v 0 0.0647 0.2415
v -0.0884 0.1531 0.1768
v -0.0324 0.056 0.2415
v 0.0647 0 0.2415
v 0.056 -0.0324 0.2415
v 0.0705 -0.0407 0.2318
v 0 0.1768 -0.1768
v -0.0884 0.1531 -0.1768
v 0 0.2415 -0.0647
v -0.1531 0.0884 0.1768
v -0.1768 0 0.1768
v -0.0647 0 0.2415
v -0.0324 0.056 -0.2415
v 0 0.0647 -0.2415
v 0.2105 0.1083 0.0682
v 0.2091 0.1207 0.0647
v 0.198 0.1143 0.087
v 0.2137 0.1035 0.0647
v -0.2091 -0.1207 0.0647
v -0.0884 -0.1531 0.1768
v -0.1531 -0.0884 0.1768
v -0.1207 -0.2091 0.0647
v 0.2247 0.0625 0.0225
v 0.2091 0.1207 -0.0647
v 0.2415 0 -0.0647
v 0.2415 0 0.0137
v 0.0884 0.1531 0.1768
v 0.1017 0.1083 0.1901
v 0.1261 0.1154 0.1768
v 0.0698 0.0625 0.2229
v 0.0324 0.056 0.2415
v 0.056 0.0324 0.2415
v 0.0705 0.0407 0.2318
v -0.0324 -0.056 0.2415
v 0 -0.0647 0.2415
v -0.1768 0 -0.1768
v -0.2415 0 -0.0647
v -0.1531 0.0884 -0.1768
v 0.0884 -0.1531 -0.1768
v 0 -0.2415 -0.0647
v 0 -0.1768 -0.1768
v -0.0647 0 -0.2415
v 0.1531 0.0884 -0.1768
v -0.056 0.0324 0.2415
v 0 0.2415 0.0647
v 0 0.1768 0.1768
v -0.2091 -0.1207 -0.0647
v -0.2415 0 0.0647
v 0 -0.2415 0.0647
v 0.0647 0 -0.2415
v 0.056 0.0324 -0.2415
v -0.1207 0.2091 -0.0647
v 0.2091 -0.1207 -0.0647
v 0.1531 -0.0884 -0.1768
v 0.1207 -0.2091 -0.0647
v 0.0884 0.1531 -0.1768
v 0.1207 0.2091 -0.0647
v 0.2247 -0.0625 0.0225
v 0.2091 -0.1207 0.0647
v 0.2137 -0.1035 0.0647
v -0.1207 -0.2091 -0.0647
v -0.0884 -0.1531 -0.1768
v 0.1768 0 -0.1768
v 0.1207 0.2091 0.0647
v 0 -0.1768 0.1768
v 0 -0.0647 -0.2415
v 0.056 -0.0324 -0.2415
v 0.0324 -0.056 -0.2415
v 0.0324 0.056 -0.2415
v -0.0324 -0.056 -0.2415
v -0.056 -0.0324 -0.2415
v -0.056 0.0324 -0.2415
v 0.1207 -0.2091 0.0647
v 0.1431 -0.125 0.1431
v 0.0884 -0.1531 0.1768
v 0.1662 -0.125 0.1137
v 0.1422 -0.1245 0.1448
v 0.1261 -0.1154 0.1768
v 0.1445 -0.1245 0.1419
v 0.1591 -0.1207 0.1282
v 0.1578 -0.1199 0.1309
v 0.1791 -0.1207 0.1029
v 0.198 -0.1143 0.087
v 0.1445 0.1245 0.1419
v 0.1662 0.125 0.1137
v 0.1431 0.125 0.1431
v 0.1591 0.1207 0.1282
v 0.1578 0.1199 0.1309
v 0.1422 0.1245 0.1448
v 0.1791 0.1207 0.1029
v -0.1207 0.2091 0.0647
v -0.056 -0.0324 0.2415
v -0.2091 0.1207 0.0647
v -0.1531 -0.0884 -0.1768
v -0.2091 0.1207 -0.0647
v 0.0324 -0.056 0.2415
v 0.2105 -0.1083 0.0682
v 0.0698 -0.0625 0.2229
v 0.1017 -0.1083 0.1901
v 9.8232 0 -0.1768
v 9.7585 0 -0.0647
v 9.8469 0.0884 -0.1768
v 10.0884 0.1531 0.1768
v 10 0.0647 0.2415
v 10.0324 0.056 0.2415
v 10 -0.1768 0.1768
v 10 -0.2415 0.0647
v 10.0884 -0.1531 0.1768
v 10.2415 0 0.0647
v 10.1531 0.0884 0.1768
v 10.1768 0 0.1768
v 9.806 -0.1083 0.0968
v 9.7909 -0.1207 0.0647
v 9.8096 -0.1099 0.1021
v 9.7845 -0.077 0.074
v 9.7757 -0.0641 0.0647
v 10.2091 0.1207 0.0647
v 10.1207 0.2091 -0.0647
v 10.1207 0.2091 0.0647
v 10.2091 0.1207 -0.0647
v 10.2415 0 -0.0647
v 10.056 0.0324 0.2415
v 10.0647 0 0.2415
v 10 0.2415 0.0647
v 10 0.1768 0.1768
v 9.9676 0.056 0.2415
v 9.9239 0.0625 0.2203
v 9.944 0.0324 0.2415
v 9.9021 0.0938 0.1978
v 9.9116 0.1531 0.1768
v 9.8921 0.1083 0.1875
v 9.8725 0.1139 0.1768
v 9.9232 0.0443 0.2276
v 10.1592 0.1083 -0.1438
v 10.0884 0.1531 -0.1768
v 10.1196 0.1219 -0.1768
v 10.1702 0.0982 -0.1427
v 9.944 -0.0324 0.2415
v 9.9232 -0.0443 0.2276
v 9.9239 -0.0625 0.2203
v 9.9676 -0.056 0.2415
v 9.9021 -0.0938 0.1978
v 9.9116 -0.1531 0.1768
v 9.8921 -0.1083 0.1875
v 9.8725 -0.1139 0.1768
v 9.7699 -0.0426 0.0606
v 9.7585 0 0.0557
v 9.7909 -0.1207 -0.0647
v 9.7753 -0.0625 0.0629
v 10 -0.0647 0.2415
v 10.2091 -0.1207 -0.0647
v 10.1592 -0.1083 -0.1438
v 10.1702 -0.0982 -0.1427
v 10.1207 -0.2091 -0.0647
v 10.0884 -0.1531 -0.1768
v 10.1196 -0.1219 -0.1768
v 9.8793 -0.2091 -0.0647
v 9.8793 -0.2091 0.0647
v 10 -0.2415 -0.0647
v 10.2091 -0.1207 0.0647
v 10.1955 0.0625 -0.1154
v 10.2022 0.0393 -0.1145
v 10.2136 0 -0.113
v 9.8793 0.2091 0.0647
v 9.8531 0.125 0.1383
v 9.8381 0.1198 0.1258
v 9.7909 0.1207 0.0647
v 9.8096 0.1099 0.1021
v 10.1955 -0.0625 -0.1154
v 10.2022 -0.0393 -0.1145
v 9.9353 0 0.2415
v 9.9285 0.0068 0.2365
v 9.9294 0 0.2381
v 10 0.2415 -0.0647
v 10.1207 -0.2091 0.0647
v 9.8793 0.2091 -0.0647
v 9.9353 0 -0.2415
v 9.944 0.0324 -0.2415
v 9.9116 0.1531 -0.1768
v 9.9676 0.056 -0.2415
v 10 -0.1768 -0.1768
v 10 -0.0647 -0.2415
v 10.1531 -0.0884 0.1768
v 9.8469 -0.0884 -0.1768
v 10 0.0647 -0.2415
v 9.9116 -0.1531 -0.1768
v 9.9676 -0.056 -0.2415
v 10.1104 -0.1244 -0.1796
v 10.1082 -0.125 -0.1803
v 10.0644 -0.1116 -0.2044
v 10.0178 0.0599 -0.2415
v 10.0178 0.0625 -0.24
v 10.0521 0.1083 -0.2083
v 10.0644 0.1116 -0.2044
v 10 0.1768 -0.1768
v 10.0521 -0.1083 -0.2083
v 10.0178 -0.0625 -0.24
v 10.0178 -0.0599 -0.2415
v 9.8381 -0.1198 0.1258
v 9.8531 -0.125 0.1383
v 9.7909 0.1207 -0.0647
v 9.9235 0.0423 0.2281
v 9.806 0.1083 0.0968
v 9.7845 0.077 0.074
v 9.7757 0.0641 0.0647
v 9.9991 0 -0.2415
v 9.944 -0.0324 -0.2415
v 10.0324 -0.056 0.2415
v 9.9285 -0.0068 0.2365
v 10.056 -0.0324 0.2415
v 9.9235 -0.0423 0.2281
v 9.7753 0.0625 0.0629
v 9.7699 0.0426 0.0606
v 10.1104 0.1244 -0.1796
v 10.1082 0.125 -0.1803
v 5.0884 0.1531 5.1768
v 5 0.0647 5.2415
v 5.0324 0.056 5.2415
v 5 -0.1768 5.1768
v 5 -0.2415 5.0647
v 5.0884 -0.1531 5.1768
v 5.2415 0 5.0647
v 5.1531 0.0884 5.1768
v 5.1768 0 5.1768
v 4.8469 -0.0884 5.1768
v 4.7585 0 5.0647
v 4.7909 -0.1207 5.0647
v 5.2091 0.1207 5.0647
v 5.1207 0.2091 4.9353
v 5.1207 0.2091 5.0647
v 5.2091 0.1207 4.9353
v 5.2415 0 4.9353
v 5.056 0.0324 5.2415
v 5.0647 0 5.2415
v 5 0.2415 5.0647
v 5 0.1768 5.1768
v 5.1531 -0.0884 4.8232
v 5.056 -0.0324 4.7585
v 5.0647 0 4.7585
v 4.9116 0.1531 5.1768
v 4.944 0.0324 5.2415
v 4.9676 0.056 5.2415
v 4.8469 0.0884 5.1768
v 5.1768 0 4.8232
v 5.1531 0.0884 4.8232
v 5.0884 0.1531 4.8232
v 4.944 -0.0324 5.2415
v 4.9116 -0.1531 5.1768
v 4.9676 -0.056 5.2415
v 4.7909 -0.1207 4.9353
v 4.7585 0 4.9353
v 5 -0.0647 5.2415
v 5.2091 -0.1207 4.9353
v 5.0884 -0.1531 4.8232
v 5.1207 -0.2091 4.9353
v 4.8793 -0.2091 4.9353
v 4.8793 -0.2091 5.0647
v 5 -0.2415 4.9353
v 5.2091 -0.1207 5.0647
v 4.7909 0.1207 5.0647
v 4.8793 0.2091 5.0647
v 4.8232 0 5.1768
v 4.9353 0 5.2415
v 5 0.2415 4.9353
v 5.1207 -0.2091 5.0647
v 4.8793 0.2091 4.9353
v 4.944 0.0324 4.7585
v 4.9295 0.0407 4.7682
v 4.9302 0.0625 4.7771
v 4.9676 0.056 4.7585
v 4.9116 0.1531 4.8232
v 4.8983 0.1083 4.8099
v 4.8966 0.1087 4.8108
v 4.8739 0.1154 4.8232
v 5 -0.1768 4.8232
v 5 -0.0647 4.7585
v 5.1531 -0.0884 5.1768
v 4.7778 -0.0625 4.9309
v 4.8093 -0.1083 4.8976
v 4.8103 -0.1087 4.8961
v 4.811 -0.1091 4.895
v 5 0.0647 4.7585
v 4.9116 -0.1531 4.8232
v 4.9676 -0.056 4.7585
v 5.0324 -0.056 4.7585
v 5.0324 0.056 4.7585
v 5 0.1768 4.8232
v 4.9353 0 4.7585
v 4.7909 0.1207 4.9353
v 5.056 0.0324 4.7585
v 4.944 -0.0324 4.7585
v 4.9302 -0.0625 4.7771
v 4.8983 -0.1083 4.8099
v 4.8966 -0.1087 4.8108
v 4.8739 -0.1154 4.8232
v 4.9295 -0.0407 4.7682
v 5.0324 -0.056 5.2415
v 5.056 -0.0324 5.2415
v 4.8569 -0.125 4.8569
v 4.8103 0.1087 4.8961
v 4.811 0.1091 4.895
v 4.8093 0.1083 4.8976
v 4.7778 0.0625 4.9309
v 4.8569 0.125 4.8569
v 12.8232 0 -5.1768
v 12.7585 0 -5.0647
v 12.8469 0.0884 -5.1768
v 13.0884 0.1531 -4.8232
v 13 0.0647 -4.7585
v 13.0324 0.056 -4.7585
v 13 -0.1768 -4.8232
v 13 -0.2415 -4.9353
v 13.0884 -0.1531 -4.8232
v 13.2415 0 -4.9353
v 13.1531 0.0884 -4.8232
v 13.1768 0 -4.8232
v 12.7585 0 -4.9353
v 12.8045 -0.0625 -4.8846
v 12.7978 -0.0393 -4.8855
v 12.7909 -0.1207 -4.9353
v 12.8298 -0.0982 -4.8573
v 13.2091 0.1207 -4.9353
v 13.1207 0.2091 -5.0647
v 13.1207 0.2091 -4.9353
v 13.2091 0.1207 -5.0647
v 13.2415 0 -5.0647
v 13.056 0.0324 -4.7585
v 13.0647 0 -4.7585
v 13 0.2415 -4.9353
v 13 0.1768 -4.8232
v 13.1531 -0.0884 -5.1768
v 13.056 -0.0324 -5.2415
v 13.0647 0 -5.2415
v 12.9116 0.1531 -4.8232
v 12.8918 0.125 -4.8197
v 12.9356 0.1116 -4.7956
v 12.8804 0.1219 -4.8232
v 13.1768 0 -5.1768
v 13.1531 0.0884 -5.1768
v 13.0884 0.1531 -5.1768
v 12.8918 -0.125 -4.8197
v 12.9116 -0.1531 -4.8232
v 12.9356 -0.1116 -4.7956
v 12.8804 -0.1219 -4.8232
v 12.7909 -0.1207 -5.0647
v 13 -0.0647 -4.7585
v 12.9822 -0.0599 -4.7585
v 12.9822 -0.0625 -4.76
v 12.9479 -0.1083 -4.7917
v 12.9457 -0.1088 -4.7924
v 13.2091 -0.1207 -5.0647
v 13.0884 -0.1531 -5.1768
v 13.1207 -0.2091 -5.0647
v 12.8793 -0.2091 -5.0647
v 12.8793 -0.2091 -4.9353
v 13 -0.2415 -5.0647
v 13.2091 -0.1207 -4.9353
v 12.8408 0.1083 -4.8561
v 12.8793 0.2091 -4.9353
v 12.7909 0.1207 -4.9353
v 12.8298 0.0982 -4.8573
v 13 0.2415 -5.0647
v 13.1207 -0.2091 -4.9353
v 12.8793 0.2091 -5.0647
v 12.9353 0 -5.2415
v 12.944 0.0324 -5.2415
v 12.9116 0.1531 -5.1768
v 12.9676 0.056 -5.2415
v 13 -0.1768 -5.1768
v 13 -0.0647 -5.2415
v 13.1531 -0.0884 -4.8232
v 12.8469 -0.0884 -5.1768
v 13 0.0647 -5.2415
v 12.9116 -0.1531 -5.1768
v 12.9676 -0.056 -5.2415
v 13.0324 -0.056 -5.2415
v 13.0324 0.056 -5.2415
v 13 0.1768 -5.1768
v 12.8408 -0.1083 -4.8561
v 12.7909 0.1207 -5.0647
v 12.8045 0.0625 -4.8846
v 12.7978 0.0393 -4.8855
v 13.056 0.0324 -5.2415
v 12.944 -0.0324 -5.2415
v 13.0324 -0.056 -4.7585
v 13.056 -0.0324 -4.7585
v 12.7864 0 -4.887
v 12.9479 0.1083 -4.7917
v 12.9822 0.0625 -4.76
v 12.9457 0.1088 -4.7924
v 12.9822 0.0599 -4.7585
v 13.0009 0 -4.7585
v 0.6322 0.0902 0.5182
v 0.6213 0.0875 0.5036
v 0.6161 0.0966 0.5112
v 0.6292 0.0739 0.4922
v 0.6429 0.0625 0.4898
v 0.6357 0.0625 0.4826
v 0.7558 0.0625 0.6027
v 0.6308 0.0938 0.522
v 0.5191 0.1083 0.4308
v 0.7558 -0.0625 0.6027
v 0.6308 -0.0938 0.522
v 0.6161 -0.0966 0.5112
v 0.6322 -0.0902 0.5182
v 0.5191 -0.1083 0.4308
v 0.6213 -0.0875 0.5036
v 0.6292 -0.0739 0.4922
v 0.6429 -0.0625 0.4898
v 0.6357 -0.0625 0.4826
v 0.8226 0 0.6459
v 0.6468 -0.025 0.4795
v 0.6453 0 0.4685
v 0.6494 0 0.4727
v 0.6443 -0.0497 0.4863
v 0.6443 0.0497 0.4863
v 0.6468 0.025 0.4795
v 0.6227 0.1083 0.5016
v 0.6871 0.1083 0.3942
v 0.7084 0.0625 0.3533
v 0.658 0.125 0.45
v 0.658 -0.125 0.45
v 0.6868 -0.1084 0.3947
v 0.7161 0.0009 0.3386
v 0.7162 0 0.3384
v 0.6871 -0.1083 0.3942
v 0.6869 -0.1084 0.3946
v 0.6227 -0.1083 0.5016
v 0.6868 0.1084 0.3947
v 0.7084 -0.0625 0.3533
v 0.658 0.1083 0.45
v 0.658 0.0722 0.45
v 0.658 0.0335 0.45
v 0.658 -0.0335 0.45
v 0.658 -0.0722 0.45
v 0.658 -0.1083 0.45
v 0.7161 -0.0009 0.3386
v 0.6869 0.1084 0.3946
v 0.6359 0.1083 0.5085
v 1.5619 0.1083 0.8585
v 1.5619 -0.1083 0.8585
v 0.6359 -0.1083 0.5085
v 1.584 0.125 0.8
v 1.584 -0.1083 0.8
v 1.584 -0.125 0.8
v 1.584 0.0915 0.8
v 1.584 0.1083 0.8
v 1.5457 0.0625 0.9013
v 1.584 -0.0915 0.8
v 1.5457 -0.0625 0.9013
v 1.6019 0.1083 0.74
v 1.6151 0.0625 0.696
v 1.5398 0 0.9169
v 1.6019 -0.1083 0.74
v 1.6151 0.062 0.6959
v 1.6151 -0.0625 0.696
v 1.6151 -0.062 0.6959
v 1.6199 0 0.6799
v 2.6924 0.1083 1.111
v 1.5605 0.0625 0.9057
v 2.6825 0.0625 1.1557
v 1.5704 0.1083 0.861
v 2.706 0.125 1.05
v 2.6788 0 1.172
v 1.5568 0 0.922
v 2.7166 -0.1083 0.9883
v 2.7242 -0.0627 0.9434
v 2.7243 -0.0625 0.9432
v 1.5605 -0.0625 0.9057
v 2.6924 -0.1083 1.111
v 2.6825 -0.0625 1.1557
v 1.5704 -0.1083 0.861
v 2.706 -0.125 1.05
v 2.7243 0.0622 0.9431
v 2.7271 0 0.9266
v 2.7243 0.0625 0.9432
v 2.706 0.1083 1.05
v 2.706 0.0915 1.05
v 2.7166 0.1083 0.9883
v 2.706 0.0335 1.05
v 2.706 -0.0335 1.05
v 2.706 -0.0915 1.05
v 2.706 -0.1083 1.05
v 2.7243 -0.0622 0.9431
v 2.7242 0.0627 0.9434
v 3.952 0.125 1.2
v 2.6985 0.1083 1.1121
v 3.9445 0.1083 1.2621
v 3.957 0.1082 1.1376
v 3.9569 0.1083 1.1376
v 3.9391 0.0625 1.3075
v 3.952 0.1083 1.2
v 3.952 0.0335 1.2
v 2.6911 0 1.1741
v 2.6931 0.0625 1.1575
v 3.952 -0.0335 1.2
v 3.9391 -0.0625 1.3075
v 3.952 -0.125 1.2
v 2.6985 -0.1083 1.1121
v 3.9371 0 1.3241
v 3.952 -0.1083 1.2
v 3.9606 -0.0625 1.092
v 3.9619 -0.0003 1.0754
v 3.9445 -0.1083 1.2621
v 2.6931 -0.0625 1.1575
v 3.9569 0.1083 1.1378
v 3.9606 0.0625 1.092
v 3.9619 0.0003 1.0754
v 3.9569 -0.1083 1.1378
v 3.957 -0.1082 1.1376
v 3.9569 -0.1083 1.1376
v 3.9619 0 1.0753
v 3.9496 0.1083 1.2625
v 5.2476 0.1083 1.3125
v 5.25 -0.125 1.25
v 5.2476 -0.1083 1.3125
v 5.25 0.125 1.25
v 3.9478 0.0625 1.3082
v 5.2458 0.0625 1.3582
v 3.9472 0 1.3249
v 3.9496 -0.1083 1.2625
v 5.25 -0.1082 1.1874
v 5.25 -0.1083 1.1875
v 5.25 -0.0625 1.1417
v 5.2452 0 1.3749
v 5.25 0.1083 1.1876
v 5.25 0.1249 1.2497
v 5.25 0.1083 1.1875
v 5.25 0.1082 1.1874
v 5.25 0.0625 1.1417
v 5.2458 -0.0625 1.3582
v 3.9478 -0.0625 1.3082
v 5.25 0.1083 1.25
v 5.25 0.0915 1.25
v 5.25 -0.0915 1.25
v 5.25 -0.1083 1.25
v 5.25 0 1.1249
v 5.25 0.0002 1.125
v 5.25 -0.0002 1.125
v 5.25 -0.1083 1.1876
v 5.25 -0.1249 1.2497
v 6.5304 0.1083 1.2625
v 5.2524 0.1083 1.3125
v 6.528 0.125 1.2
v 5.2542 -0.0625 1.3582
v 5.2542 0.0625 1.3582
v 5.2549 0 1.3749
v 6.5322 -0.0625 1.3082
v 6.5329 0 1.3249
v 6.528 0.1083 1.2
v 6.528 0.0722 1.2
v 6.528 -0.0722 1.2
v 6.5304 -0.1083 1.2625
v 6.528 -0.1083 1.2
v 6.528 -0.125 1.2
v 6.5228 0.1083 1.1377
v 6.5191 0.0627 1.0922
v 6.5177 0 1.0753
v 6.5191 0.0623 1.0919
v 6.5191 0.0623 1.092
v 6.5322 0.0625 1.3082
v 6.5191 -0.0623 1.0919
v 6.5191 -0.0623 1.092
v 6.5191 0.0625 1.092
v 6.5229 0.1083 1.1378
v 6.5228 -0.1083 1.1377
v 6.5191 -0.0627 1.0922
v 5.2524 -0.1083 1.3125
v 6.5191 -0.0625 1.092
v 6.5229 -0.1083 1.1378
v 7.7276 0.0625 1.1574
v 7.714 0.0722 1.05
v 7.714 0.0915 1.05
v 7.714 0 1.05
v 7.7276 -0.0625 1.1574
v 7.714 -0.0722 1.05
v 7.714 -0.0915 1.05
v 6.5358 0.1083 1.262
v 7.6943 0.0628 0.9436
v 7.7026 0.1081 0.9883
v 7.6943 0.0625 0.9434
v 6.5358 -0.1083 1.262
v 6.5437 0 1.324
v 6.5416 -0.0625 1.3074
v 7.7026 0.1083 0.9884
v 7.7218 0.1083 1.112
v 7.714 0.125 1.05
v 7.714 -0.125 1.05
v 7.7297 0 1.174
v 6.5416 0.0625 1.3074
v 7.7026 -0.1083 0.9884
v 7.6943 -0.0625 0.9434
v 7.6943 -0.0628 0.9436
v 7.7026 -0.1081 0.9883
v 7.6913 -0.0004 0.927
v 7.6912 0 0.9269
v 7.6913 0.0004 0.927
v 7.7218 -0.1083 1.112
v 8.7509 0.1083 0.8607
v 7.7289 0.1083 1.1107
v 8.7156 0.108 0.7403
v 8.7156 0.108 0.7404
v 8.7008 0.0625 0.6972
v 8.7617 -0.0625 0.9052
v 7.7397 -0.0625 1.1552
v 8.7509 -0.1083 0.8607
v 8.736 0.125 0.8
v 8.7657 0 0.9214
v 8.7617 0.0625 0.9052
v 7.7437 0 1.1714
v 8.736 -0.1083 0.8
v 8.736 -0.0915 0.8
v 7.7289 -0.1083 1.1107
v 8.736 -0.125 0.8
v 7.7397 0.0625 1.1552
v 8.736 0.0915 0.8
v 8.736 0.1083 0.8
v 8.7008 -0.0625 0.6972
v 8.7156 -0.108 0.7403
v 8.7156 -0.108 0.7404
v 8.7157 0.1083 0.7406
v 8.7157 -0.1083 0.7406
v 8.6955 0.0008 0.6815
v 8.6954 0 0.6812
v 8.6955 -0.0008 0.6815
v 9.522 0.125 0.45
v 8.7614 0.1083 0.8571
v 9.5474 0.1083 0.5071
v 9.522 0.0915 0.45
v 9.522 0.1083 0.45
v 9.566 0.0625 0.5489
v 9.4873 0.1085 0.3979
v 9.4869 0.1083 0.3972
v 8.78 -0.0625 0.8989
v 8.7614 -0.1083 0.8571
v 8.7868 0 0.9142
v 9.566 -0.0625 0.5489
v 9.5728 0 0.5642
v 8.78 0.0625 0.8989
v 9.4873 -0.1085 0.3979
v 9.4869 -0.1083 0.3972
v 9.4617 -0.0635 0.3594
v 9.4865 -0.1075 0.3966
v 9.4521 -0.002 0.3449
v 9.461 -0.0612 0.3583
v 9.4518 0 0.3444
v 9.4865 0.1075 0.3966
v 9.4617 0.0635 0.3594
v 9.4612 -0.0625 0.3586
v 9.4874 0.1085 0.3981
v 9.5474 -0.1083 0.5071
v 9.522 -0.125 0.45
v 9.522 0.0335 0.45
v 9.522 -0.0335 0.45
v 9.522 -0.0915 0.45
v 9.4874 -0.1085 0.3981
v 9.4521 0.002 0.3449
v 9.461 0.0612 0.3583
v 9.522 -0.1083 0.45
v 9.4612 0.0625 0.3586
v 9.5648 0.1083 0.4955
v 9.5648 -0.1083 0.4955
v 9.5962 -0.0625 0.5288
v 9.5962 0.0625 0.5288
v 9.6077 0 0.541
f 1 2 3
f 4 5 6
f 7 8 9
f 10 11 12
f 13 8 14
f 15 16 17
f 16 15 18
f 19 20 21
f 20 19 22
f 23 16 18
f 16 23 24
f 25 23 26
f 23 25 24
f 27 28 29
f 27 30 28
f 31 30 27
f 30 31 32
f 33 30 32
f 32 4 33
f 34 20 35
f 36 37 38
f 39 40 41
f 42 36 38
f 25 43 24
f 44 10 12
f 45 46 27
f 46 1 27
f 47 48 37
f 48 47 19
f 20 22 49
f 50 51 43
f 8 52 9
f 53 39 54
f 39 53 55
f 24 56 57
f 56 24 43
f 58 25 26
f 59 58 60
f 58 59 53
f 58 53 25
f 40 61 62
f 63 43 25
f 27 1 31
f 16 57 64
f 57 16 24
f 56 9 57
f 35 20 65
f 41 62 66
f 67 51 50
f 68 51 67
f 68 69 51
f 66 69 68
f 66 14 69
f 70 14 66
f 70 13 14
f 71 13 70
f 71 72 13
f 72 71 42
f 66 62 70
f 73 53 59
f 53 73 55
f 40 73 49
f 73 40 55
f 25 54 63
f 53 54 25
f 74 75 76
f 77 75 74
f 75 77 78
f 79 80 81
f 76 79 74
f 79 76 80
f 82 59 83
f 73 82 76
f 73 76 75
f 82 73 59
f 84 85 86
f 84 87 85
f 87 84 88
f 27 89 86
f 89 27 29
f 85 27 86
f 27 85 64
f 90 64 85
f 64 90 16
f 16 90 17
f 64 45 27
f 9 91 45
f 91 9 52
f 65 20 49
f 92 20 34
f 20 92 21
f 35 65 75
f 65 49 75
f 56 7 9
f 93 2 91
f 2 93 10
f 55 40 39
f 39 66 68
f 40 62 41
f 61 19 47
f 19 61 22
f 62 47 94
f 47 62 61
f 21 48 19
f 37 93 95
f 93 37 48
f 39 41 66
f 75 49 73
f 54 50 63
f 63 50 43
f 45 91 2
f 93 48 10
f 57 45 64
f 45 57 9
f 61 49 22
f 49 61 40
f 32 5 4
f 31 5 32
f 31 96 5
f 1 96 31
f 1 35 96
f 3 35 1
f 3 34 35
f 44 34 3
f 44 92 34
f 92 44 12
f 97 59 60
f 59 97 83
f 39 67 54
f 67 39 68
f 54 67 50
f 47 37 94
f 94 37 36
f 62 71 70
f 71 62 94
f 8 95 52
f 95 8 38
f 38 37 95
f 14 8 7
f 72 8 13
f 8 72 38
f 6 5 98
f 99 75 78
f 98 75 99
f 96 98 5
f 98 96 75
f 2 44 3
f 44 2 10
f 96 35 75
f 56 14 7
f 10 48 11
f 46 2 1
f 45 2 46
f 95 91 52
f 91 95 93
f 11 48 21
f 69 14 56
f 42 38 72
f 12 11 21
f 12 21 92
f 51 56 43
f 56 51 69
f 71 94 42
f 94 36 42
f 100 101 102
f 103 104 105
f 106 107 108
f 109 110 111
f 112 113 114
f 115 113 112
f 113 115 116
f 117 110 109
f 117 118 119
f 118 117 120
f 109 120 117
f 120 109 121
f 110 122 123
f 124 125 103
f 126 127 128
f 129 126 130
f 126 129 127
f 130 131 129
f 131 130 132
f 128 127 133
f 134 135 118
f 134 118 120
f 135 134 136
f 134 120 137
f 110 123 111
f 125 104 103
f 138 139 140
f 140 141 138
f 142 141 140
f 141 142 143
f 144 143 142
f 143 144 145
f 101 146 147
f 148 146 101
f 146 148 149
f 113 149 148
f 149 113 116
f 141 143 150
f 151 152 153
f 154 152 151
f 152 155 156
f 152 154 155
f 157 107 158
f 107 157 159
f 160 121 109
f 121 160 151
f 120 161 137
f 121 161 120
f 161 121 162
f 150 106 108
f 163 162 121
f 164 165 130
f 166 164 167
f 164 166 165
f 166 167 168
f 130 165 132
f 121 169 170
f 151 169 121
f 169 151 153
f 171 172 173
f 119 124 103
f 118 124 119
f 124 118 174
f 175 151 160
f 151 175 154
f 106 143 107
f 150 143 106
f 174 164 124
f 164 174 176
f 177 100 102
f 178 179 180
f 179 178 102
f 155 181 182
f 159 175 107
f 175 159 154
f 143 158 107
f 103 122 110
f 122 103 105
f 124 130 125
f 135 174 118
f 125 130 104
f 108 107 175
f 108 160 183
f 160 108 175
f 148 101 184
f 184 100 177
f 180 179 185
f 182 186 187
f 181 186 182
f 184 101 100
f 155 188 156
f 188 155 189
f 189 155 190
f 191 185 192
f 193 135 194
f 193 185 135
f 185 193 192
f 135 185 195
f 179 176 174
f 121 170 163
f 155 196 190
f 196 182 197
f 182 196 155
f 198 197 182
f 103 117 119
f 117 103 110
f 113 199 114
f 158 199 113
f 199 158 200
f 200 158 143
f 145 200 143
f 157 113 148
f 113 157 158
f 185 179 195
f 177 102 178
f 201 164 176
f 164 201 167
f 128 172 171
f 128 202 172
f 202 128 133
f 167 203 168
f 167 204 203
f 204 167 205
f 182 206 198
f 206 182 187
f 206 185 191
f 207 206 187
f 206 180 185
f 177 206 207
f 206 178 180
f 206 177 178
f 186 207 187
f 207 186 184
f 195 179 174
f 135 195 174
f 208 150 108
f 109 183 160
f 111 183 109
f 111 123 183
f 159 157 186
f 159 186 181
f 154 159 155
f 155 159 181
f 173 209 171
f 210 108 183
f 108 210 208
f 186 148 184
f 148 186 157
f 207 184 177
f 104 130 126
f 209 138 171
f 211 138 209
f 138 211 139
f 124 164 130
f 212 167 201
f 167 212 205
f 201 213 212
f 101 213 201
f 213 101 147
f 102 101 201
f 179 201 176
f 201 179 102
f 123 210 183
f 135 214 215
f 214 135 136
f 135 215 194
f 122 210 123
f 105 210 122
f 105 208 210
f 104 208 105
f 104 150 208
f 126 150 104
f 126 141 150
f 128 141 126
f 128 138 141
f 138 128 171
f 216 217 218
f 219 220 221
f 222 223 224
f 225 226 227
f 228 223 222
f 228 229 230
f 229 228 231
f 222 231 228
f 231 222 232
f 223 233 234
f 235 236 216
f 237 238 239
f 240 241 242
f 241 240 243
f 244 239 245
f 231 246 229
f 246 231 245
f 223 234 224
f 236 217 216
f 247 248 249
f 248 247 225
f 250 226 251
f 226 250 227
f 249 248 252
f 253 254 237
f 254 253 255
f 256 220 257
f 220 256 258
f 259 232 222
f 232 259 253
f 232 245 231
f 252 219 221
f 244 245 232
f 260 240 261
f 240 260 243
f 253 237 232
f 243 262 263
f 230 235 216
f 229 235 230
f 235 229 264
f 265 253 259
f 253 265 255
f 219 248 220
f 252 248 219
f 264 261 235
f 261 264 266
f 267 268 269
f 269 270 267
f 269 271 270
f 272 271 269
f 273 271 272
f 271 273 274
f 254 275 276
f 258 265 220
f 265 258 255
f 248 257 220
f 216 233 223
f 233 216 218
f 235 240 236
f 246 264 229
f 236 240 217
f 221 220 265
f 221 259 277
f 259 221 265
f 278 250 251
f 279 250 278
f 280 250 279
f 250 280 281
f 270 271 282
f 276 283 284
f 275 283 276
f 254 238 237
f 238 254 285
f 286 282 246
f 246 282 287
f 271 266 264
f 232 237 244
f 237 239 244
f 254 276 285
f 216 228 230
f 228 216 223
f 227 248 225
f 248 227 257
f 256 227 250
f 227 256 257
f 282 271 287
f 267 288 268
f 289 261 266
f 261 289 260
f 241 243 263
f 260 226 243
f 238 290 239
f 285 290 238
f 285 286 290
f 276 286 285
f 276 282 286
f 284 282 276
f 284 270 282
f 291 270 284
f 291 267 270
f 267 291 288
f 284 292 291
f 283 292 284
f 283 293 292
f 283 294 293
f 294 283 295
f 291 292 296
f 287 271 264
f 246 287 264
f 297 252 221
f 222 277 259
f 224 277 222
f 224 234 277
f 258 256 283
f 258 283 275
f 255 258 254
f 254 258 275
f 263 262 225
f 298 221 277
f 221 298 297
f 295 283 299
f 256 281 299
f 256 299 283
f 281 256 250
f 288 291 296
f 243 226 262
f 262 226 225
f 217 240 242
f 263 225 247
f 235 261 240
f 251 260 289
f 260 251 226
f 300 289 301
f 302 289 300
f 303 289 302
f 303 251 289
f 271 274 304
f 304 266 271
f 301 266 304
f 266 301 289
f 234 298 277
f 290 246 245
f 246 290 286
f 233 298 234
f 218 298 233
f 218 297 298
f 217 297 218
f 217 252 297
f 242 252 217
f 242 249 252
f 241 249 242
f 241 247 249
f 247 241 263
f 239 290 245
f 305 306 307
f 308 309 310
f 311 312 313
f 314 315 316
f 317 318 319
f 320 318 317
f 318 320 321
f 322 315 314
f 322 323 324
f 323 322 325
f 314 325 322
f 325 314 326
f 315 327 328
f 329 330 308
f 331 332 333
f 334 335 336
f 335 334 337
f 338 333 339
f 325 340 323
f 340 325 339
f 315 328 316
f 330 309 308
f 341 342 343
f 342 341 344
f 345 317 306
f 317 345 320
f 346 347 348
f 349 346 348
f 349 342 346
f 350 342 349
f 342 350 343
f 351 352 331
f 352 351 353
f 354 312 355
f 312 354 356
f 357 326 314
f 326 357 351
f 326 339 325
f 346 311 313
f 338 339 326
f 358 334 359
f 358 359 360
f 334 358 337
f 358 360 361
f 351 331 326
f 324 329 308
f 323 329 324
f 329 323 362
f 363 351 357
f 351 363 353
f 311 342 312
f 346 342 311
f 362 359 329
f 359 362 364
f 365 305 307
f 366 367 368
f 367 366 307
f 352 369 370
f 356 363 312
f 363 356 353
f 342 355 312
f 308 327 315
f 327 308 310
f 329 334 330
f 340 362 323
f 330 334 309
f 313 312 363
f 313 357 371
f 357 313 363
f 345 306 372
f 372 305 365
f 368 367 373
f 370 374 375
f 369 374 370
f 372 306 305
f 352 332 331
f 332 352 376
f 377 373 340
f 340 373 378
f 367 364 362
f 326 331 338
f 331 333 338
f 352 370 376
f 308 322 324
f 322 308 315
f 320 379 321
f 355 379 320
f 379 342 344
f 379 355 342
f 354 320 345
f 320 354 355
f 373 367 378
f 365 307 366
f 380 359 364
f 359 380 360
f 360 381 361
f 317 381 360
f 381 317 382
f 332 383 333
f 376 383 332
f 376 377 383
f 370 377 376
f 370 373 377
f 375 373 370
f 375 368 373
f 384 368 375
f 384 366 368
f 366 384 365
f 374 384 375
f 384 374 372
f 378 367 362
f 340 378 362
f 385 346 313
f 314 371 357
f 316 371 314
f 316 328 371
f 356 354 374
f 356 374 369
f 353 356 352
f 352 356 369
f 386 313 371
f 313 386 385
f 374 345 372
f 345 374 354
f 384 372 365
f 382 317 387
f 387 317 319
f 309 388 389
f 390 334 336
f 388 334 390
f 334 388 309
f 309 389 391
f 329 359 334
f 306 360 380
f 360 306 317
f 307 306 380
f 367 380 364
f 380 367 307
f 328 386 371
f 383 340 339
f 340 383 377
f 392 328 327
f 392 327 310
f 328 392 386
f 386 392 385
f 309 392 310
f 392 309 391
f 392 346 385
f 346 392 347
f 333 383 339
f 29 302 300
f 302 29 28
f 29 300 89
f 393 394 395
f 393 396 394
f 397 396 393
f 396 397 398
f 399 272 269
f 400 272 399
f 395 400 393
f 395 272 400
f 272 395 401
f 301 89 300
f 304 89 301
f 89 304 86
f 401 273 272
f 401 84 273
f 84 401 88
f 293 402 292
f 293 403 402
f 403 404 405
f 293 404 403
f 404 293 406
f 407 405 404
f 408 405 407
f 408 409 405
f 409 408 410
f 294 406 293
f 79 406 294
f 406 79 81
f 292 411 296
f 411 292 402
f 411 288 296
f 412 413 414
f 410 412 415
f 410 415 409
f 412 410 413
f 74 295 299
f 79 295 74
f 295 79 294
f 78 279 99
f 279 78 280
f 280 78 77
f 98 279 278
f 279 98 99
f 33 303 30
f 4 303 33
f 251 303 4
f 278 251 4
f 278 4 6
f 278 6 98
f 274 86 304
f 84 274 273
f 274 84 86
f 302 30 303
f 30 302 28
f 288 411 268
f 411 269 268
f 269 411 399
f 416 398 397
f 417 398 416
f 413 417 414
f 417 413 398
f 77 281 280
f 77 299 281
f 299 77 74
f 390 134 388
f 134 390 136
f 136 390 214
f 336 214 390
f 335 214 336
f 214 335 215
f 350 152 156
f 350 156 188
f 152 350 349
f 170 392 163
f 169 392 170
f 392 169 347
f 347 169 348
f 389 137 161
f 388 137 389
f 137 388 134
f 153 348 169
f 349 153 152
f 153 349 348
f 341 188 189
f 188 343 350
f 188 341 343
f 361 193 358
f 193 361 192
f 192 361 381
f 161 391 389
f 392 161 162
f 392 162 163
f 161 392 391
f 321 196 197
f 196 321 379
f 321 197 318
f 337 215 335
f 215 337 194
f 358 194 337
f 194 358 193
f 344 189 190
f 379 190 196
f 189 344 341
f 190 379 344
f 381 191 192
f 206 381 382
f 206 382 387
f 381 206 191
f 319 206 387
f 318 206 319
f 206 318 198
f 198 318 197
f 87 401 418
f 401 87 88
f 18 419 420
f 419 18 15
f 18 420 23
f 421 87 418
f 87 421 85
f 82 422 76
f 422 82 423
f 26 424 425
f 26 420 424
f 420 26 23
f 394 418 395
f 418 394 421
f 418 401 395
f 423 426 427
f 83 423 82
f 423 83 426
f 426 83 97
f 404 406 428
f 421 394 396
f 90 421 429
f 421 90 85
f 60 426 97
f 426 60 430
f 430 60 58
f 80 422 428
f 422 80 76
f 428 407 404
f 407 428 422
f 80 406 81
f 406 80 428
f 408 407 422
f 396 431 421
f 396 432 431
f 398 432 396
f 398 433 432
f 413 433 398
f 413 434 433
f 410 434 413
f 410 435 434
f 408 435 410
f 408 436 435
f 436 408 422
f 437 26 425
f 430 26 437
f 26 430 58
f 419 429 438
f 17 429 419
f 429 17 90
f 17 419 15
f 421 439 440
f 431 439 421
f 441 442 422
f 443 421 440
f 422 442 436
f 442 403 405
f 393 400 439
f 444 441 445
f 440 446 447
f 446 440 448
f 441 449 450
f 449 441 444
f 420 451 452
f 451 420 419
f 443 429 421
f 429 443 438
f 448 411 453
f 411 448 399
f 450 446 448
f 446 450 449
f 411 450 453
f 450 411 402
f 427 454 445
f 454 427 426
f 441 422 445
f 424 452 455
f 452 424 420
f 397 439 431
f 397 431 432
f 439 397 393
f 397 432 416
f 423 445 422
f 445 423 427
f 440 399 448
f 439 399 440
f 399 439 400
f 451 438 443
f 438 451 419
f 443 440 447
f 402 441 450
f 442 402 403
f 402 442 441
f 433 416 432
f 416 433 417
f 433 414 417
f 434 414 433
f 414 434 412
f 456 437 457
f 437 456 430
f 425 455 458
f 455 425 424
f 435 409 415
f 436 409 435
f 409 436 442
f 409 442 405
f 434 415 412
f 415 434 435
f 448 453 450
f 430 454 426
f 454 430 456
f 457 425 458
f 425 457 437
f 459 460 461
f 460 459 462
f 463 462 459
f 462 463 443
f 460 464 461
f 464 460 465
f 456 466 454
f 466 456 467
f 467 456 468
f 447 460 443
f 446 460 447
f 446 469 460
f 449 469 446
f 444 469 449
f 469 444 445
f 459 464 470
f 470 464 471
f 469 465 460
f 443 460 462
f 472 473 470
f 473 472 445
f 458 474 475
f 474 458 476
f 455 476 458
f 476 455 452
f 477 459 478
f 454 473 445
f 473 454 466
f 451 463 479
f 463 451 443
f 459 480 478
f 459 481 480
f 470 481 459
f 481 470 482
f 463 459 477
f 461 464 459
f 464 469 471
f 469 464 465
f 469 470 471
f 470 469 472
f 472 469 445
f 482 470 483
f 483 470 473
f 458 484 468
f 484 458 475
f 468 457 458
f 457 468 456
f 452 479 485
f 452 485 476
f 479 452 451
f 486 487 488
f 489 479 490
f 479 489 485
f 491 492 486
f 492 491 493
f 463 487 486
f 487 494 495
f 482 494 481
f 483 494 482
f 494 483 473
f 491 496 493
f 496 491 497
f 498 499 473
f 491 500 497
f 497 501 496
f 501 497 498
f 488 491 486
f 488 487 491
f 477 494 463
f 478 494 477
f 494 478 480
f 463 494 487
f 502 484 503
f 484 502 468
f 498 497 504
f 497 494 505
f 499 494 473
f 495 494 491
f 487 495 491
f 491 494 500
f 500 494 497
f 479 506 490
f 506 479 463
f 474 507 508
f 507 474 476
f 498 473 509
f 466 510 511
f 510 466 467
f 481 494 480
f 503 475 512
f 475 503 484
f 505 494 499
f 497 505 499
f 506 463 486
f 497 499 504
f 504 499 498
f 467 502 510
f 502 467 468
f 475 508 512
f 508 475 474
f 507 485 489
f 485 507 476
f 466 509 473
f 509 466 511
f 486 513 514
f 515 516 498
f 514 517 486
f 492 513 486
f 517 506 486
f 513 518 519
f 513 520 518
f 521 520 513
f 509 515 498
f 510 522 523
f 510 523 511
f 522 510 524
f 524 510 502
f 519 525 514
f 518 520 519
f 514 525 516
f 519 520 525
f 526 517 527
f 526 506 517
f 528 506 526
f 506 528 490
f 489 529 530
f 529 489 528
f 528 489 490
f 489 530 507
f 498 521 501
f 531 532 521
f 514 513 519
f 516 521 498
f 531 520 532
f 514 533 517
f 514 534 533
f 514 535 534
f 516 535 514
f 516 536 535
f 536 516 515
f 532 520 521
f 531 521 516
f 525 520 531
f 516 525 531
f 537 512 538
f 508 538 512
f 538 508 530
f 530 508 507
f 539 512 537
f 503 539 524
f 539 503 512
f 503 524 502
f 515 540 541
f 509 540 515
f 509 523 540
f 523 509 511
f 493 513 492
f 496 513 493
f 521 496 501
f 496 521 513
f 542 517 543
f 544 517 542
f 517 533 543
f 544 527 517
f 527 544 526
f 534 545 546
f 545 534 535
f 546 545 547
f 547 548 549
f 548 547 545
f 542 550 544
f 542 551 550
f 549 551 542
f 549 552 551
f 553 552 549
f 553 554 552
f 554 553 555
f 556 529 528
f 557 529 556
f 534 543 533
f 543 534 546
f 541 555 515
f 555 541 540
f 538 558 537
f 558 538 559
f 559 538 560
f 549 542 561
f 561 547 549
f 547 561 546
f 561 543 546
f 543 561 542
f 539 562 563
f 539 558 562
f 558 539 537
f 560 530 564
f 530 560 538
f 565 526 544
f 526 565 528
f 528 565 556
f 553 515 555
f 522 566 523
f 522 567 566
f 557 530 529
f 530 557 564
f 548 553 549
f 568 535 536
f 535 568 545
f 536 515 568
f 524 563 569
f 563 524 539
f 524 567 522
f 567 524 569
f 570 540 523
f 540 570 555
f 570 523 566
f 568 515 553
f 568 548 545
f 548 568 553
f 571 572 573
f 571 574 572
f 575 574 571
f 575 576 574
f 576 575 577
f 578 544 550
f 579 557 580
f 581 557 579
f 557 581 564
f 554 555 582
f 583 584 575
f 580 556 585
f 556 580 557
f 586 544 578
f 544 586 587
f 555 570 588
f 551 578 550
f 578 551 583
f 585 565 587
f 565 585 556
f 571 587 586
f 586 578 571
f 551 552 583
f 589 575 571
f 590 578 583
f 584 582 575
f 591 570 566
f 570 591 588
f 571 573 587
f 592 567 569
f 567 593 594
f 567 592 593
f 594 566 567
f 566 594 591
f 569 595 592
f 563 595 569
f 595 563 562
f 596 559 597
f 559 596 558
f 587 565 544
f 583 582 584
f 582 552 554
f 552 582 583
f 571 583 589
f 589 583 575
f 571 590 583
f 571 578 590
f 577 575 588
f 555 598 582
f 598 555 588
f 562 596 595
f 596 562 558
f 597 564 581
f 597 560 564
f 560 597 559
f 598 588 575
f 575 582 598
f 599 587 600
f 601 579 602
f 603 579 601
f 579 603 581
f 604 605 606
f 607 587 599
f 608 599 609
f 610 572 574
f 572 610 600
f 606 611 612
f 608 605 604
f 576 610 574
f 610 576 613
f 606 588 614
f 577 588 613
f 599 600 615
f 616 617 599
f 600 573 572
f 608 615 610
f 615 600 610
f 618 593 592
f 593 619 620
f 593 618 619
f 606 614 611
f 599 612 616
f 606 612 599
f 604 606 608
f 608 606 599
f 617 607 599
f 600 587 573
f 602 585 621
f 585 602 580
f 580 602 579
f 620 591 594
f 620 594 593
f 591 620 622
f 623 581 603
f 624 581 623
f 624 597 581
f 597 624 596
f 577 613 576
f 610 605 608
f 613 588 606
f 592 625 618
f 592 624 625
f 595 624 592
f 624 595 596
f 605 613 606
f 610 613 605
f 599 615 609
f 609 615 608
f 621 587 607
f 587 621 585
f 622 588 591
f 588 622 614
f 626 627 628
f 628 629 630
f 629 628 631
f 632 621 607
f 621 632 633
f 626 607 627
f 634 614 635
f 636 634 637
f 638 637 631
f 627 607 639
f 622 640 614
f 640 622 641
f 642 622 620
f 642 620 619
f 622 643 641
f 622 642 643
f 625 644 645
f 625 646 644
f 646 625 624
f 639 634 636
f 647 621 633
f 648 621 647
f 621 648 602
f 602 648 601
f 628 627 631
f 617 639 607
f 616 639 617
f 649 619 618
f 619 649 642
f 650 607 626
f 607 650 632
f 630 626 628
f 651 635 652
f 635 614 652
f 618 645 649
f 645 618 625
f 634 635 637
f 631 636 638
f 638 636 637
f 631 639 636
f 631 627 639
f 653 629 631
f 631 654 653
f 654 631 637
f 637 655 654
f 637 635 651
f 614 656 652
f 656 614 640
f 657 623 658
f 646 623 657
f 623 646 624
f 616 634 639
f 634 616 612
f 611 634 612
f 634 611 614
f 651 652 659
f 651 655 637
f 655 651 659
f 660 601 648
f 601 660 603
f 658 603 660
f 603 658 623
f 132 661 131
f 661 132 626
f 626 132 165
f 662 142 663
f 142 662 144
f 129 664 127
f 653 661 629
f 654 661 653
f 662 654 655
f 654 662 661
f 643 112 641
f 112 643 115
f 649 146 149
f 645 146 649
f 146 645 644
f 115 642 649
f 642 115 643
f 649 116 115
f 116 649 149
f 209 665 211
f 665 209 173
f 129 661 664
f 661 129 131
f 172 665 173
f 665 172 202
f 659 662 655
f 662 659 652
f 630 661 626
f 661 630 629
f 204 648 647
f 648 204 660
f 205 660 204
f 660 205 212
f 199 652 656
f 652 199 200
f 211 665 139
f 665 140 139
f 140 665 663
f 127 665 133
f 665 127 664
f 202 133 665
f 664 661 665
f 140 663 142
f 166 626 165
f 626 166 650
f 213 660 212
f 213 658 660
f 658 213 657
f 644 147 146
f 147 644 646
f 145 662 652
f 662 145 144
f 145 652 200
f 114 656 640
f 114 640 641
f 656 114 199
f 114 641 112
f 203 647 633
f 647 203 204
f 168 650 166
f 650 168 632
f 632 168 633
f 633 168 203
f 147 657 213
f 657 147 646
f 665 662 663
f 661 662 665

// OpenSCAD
// file: imaging.scad
function max(x,y) = x>y ? x : y;
function min(x,y) = x<y ? x : y;

function mix(x, y, a) = x(1-a)+y*a;
function mix3(x, y,a) = [mix(x[0],y[0],a), mix(x[1],y[1],a), mix(x[2],y[2],a)];

function clamp(x, minValue, maxValue) = min(max(x,minValue),maxValue);
function clamp3(x, minValue, maxValue) = [clamp(x[0]), clamp(x[1]), clamp(x[2])];

function dot(v1,v2) = v1[0]*v2[0]+v1[1]*v2[1]+v1[2]*v2[2]; 

function map_to_array(len, u) = u*len >= len ? len-1 : floor(u*len);

/*
	Function: image()

	Description: Create an image object for later usage.  The image
	Is a RGB, interleaved image, with all elements flat in the array

	Parameters:
		width  - width in pixels
		height - height in pixels
		maxvalue	- The maximum value of any component
		values - The array of values representing the image
*/
function image(width, height, maxvalue, rgb_triplets, cpe=3) = [width, height, maxvalue, rgb_triplets, cpe];
function image_getoffset(img, x,y) = ((img[0]*(y))+x)*img[4];

function _image_getpixel(img, offset) = [img[3][offset], img[3][offset+1], img[3][offset+2]];

function image_pixel_normalize(img, pixel) = [pixel[0]/img[2], pixel[1]/img[2], pixel[2]/img[2]];
function image_getpixel(img, x, y) = _image_getpixel(img, image_getoffset(img, x,y));

 
function image_gettexel(img, u, v) = image_pixel_normalize(img, image_getpixel(img, map_to_array(img[0],u), map_to_array(img[1],v)));


/*
	checker_image

	This is a useful image to be used if no other image is available.
	It is a simple black/white image that is 8x8 pixels
*/
checker_array = [ 
0,0,0, 255,255,255, 0,0,0, 255,255,255, 0,0,0, 255,255,255, 0,0,0, 255,255,255,
255,255,255, 0,0,0, 255,255,255, 0,0,0, 255,255,255, 0,0,0, 255,255,255, 0,0,0,
0,0,0, 255,255,255, 0,0,0, 255,255,255, 0,0,0, 255,255,255, 0,0,0, 255,255,255,
255,255,255, 0,0,0, 255,255,255, 0,0,0, 255,255,255, 0,0,0, 255,255,255, 0,0,0,
0,0,0, 255,255,255, 0,0,0, 255,255,255, 0,0,0, 255,255,255, 0,0,0, 255,255,255,
255,255,255, 0,0,0, 255,255,255, 0,0,0, 255,255,255, 0,0,0, 255,255,255, 0,0,0,
0,0,0, 255,255,255, 0,0,0, 255,255,255, 0,0,0, 255,255,255, 0,0,0, 255,255,255,
255,255,255, 0,0,0, 255,255,255, 0,0,0, 255,255,255, 0,0,0, 255,255,255, 0,0,0
];

checker_image = image(8,8,255, checker_array); 

//====================================
// COLOR MAPPING
//====================================

// For modern day monitor luminance
function luminance(rgb) = dot([0.2125, 0.7154, 0.0721], rgb);

// For non-linear luminance, and old NTSC
function luminance_ntsc(rgb) = dot([0.299, 0.587, 0.114], rgb);
// file: hermite.scad
//=======================================
//
//		Hermite Curve Routines
//
//=======================================

include <maths.scad>

 /* 
	Hermite Curve Basis Functions
	Expressed in terms of cubic Bernstein basis functions

	For cubic Hermite curves
	these functions give the weights per control point.

http://en.wikipedia.org/wiki/Cubic_Hermite_spline
*/

// To express in terms of Bernstein cubic basis functions
function HERMp0(u) = Basis03(u)+Basis13(u);	// h00
function HERMm0(u) = 1/3 * Basis13(u);		// h10
function HERMp1(u) = Basis33(u) + Basis23(u);	// h01
function HERMm1(u) = -1/3 * Basis23(u);		// h11





// Given an array of control points
// Return a point on the Hermite curve as specified by the 
// parameter: 0<= 'u' <=1
function HermA(cps, u) = [HERMp0(u)*cps[0][0][0], HERMp0(u)*cps[0][0][1], HERMp0(u)*cps[0][0][2]];		// p0
function HermB(cps, u) = [HERMm0(u)*cps[0][1][0], HERMm0(u)*cps[0][1][1], HERMm0(u)*cps[0][1][2]];	// m0
function HermC(cps, u) = [HERMp1(u)*cps[1][0][0], HERMp1(u)*cps[1][0][1], HERMp1(u)*cps[1][0][2]];		// p1
function HermD(cps, u) = [HERMm1(u)*cps[1][1][0], HERMm1(u)*cps[1][1][1], HERMm1(u)*cps[1][1][2]];	// m1



// Hermite Interpolation
function herp(cps, u) = HermA(cps,u)+HermB(cps,u)+HermC(cps,u)+HermD(cps,u);

// Calculate a point on a Hermite mesh
// Given the mesh, and the parametric 'u', and 'v' values
function herpm(mesh, uv) = herp(
	[herp(mesh[0], uv[0]), herp(mesh[1], uv[0]),
	herp(mesh[2], uv[0]), herp(mesh[3], uv[0])], 
	uv[1]);


// Given a mesh, and the 4 parametric points, return a quad that has the appropriate 
// points along the curve, in counter clockwise order
function GetHermiteQuad(mesh, u1v1, u2v2) = [
	herpm(mesh, [u1v1[0],u2v2[1]]), 
	herpm(mesh, u1v1),
	herpm(mesh, [u2v2[0],u1v1[1]]), 
	herpm(mesh, u2v2)];
// main file
include <Renderer.scad>
include <hermite.scad>


herm1 = [[0,0,0],  [10,0,0], [5,0,5], [3,0,-5]];
herm2 = [[0,0,0],  [10,0,0], [5,0,-15], [3,0,15]];
herm3 = [[0,0,0], [30,0,0], [0,0,-10], [0,0,10]];
herm4 = [[0,0,0], [10,0,0], [0,0,5], [0,0,-5]];

sweep1 = [[[0,0,0],[0,0,10]], [[0,25,0],[0,0,-10]]];
sweep2 = [[[0,0,0],[10,0,10]], [[10,25,15],[-10,0,-10]]];
sweep3 = [[0,0,0],[0,60,40],[0,25,-10], [0,10,-15]];

//sweep_hermite(herm3, sweep3, 
//	steps=12, 
//	thickness=3, 
//	showControlFrame=true);


//DisplayCubicCurve(M = cubic_hermite_M(), umult = 1, 
//	cps=herm4,
//	steps=20,
//	showNormals=true);

DisplayHermiteCurve(herm1, steps=10);
//DisplayHermiteCurve(herm2, steps=10);
//DisplayHermiteCurve(herm3, steps=10);
//DisplayHermiteCurve(sweep1, steps=10);
//DisplayHermiteCurve(sweep2, steps=10);

//DisplayBasis();



//=======================================
//		Modules
//=======================================


// 
// Not quite ready for prime time
// It doesn't quite make sense to interpolate the tangents
module linear_extrude_hermite(mesh, 
	colors=[[1,0,0],[1,1,0],[0,1,1],[0,0,1]], 
	steps=4, 
	thickness=1, 
	showControlFrame = false)
{
	if (showControlFrame)
		DisplayHermiteControlFrame(mesh, steps=steps);
	
	for (ustep = [0:steps-1])
	{
		for (vstep=[0:steps-1])
		{
			assign(ufrac1 = ustep/steps)
			assign(ufrac2 = (ustep+1)/steps)
			assign(vfrac1=vstep/steps)
			assign(vfrac2=(vstep+1)/steps)
			assign(quad = GetHermiteQuad(mesh, [ufrac1,vfrac1], [ufrac2,vfrac2]))
			{
				//color([acolor[0], acolor[1], acolor[2], ufrac1/vfrac2])
				color(berp(colors, vfrac1))
				PlaceQuad(quad);
				//DisplayQuadFrame(quad);
				//DisplayQuadShard(quad, thickness=thickness);
			}
		}
	}
}

module DisplayBasis()
{
	steps = 100;
	height = 100;
	width = 100;
	offset = width/steps;
	radius=1;
	
	for (step=[0:steps])
	{
		assign(u=step/steps)
		{
			translate([step*(offset), 0, 0])
			color([1,0,0])
			cylinder(r=radius, h=HERMp0(u)*height);
	
	
			translate([step*(offset), 10, 0])
			color([0,1,0])
			cylinder(r=radius, h=HERMm0(u)*height);
	
			translate([step*(offset), 20, 0])	
			rotate([180, 0,0])
			color([0,1,1])
			cylinder(r=radius, h=-HERMm1(u)*height);

			echo(HERMp1(u));
			translate([step*(offset), 30, 0])
			color([0,0,1])
			cylinder(r=radius, h=HERMp1(u)*height);
	
	
		}
	}
}



module DisplayHermiteControlFrame(mesh, steps=12)
{
	DisplayHermiteCurve(mesh[0]);
	DisplayHermiteCurve(mesh[1]);
	DisplayHermiteCurve(mesh[2]);
	DisplayHermiteCurve(mesh[3]);

}
